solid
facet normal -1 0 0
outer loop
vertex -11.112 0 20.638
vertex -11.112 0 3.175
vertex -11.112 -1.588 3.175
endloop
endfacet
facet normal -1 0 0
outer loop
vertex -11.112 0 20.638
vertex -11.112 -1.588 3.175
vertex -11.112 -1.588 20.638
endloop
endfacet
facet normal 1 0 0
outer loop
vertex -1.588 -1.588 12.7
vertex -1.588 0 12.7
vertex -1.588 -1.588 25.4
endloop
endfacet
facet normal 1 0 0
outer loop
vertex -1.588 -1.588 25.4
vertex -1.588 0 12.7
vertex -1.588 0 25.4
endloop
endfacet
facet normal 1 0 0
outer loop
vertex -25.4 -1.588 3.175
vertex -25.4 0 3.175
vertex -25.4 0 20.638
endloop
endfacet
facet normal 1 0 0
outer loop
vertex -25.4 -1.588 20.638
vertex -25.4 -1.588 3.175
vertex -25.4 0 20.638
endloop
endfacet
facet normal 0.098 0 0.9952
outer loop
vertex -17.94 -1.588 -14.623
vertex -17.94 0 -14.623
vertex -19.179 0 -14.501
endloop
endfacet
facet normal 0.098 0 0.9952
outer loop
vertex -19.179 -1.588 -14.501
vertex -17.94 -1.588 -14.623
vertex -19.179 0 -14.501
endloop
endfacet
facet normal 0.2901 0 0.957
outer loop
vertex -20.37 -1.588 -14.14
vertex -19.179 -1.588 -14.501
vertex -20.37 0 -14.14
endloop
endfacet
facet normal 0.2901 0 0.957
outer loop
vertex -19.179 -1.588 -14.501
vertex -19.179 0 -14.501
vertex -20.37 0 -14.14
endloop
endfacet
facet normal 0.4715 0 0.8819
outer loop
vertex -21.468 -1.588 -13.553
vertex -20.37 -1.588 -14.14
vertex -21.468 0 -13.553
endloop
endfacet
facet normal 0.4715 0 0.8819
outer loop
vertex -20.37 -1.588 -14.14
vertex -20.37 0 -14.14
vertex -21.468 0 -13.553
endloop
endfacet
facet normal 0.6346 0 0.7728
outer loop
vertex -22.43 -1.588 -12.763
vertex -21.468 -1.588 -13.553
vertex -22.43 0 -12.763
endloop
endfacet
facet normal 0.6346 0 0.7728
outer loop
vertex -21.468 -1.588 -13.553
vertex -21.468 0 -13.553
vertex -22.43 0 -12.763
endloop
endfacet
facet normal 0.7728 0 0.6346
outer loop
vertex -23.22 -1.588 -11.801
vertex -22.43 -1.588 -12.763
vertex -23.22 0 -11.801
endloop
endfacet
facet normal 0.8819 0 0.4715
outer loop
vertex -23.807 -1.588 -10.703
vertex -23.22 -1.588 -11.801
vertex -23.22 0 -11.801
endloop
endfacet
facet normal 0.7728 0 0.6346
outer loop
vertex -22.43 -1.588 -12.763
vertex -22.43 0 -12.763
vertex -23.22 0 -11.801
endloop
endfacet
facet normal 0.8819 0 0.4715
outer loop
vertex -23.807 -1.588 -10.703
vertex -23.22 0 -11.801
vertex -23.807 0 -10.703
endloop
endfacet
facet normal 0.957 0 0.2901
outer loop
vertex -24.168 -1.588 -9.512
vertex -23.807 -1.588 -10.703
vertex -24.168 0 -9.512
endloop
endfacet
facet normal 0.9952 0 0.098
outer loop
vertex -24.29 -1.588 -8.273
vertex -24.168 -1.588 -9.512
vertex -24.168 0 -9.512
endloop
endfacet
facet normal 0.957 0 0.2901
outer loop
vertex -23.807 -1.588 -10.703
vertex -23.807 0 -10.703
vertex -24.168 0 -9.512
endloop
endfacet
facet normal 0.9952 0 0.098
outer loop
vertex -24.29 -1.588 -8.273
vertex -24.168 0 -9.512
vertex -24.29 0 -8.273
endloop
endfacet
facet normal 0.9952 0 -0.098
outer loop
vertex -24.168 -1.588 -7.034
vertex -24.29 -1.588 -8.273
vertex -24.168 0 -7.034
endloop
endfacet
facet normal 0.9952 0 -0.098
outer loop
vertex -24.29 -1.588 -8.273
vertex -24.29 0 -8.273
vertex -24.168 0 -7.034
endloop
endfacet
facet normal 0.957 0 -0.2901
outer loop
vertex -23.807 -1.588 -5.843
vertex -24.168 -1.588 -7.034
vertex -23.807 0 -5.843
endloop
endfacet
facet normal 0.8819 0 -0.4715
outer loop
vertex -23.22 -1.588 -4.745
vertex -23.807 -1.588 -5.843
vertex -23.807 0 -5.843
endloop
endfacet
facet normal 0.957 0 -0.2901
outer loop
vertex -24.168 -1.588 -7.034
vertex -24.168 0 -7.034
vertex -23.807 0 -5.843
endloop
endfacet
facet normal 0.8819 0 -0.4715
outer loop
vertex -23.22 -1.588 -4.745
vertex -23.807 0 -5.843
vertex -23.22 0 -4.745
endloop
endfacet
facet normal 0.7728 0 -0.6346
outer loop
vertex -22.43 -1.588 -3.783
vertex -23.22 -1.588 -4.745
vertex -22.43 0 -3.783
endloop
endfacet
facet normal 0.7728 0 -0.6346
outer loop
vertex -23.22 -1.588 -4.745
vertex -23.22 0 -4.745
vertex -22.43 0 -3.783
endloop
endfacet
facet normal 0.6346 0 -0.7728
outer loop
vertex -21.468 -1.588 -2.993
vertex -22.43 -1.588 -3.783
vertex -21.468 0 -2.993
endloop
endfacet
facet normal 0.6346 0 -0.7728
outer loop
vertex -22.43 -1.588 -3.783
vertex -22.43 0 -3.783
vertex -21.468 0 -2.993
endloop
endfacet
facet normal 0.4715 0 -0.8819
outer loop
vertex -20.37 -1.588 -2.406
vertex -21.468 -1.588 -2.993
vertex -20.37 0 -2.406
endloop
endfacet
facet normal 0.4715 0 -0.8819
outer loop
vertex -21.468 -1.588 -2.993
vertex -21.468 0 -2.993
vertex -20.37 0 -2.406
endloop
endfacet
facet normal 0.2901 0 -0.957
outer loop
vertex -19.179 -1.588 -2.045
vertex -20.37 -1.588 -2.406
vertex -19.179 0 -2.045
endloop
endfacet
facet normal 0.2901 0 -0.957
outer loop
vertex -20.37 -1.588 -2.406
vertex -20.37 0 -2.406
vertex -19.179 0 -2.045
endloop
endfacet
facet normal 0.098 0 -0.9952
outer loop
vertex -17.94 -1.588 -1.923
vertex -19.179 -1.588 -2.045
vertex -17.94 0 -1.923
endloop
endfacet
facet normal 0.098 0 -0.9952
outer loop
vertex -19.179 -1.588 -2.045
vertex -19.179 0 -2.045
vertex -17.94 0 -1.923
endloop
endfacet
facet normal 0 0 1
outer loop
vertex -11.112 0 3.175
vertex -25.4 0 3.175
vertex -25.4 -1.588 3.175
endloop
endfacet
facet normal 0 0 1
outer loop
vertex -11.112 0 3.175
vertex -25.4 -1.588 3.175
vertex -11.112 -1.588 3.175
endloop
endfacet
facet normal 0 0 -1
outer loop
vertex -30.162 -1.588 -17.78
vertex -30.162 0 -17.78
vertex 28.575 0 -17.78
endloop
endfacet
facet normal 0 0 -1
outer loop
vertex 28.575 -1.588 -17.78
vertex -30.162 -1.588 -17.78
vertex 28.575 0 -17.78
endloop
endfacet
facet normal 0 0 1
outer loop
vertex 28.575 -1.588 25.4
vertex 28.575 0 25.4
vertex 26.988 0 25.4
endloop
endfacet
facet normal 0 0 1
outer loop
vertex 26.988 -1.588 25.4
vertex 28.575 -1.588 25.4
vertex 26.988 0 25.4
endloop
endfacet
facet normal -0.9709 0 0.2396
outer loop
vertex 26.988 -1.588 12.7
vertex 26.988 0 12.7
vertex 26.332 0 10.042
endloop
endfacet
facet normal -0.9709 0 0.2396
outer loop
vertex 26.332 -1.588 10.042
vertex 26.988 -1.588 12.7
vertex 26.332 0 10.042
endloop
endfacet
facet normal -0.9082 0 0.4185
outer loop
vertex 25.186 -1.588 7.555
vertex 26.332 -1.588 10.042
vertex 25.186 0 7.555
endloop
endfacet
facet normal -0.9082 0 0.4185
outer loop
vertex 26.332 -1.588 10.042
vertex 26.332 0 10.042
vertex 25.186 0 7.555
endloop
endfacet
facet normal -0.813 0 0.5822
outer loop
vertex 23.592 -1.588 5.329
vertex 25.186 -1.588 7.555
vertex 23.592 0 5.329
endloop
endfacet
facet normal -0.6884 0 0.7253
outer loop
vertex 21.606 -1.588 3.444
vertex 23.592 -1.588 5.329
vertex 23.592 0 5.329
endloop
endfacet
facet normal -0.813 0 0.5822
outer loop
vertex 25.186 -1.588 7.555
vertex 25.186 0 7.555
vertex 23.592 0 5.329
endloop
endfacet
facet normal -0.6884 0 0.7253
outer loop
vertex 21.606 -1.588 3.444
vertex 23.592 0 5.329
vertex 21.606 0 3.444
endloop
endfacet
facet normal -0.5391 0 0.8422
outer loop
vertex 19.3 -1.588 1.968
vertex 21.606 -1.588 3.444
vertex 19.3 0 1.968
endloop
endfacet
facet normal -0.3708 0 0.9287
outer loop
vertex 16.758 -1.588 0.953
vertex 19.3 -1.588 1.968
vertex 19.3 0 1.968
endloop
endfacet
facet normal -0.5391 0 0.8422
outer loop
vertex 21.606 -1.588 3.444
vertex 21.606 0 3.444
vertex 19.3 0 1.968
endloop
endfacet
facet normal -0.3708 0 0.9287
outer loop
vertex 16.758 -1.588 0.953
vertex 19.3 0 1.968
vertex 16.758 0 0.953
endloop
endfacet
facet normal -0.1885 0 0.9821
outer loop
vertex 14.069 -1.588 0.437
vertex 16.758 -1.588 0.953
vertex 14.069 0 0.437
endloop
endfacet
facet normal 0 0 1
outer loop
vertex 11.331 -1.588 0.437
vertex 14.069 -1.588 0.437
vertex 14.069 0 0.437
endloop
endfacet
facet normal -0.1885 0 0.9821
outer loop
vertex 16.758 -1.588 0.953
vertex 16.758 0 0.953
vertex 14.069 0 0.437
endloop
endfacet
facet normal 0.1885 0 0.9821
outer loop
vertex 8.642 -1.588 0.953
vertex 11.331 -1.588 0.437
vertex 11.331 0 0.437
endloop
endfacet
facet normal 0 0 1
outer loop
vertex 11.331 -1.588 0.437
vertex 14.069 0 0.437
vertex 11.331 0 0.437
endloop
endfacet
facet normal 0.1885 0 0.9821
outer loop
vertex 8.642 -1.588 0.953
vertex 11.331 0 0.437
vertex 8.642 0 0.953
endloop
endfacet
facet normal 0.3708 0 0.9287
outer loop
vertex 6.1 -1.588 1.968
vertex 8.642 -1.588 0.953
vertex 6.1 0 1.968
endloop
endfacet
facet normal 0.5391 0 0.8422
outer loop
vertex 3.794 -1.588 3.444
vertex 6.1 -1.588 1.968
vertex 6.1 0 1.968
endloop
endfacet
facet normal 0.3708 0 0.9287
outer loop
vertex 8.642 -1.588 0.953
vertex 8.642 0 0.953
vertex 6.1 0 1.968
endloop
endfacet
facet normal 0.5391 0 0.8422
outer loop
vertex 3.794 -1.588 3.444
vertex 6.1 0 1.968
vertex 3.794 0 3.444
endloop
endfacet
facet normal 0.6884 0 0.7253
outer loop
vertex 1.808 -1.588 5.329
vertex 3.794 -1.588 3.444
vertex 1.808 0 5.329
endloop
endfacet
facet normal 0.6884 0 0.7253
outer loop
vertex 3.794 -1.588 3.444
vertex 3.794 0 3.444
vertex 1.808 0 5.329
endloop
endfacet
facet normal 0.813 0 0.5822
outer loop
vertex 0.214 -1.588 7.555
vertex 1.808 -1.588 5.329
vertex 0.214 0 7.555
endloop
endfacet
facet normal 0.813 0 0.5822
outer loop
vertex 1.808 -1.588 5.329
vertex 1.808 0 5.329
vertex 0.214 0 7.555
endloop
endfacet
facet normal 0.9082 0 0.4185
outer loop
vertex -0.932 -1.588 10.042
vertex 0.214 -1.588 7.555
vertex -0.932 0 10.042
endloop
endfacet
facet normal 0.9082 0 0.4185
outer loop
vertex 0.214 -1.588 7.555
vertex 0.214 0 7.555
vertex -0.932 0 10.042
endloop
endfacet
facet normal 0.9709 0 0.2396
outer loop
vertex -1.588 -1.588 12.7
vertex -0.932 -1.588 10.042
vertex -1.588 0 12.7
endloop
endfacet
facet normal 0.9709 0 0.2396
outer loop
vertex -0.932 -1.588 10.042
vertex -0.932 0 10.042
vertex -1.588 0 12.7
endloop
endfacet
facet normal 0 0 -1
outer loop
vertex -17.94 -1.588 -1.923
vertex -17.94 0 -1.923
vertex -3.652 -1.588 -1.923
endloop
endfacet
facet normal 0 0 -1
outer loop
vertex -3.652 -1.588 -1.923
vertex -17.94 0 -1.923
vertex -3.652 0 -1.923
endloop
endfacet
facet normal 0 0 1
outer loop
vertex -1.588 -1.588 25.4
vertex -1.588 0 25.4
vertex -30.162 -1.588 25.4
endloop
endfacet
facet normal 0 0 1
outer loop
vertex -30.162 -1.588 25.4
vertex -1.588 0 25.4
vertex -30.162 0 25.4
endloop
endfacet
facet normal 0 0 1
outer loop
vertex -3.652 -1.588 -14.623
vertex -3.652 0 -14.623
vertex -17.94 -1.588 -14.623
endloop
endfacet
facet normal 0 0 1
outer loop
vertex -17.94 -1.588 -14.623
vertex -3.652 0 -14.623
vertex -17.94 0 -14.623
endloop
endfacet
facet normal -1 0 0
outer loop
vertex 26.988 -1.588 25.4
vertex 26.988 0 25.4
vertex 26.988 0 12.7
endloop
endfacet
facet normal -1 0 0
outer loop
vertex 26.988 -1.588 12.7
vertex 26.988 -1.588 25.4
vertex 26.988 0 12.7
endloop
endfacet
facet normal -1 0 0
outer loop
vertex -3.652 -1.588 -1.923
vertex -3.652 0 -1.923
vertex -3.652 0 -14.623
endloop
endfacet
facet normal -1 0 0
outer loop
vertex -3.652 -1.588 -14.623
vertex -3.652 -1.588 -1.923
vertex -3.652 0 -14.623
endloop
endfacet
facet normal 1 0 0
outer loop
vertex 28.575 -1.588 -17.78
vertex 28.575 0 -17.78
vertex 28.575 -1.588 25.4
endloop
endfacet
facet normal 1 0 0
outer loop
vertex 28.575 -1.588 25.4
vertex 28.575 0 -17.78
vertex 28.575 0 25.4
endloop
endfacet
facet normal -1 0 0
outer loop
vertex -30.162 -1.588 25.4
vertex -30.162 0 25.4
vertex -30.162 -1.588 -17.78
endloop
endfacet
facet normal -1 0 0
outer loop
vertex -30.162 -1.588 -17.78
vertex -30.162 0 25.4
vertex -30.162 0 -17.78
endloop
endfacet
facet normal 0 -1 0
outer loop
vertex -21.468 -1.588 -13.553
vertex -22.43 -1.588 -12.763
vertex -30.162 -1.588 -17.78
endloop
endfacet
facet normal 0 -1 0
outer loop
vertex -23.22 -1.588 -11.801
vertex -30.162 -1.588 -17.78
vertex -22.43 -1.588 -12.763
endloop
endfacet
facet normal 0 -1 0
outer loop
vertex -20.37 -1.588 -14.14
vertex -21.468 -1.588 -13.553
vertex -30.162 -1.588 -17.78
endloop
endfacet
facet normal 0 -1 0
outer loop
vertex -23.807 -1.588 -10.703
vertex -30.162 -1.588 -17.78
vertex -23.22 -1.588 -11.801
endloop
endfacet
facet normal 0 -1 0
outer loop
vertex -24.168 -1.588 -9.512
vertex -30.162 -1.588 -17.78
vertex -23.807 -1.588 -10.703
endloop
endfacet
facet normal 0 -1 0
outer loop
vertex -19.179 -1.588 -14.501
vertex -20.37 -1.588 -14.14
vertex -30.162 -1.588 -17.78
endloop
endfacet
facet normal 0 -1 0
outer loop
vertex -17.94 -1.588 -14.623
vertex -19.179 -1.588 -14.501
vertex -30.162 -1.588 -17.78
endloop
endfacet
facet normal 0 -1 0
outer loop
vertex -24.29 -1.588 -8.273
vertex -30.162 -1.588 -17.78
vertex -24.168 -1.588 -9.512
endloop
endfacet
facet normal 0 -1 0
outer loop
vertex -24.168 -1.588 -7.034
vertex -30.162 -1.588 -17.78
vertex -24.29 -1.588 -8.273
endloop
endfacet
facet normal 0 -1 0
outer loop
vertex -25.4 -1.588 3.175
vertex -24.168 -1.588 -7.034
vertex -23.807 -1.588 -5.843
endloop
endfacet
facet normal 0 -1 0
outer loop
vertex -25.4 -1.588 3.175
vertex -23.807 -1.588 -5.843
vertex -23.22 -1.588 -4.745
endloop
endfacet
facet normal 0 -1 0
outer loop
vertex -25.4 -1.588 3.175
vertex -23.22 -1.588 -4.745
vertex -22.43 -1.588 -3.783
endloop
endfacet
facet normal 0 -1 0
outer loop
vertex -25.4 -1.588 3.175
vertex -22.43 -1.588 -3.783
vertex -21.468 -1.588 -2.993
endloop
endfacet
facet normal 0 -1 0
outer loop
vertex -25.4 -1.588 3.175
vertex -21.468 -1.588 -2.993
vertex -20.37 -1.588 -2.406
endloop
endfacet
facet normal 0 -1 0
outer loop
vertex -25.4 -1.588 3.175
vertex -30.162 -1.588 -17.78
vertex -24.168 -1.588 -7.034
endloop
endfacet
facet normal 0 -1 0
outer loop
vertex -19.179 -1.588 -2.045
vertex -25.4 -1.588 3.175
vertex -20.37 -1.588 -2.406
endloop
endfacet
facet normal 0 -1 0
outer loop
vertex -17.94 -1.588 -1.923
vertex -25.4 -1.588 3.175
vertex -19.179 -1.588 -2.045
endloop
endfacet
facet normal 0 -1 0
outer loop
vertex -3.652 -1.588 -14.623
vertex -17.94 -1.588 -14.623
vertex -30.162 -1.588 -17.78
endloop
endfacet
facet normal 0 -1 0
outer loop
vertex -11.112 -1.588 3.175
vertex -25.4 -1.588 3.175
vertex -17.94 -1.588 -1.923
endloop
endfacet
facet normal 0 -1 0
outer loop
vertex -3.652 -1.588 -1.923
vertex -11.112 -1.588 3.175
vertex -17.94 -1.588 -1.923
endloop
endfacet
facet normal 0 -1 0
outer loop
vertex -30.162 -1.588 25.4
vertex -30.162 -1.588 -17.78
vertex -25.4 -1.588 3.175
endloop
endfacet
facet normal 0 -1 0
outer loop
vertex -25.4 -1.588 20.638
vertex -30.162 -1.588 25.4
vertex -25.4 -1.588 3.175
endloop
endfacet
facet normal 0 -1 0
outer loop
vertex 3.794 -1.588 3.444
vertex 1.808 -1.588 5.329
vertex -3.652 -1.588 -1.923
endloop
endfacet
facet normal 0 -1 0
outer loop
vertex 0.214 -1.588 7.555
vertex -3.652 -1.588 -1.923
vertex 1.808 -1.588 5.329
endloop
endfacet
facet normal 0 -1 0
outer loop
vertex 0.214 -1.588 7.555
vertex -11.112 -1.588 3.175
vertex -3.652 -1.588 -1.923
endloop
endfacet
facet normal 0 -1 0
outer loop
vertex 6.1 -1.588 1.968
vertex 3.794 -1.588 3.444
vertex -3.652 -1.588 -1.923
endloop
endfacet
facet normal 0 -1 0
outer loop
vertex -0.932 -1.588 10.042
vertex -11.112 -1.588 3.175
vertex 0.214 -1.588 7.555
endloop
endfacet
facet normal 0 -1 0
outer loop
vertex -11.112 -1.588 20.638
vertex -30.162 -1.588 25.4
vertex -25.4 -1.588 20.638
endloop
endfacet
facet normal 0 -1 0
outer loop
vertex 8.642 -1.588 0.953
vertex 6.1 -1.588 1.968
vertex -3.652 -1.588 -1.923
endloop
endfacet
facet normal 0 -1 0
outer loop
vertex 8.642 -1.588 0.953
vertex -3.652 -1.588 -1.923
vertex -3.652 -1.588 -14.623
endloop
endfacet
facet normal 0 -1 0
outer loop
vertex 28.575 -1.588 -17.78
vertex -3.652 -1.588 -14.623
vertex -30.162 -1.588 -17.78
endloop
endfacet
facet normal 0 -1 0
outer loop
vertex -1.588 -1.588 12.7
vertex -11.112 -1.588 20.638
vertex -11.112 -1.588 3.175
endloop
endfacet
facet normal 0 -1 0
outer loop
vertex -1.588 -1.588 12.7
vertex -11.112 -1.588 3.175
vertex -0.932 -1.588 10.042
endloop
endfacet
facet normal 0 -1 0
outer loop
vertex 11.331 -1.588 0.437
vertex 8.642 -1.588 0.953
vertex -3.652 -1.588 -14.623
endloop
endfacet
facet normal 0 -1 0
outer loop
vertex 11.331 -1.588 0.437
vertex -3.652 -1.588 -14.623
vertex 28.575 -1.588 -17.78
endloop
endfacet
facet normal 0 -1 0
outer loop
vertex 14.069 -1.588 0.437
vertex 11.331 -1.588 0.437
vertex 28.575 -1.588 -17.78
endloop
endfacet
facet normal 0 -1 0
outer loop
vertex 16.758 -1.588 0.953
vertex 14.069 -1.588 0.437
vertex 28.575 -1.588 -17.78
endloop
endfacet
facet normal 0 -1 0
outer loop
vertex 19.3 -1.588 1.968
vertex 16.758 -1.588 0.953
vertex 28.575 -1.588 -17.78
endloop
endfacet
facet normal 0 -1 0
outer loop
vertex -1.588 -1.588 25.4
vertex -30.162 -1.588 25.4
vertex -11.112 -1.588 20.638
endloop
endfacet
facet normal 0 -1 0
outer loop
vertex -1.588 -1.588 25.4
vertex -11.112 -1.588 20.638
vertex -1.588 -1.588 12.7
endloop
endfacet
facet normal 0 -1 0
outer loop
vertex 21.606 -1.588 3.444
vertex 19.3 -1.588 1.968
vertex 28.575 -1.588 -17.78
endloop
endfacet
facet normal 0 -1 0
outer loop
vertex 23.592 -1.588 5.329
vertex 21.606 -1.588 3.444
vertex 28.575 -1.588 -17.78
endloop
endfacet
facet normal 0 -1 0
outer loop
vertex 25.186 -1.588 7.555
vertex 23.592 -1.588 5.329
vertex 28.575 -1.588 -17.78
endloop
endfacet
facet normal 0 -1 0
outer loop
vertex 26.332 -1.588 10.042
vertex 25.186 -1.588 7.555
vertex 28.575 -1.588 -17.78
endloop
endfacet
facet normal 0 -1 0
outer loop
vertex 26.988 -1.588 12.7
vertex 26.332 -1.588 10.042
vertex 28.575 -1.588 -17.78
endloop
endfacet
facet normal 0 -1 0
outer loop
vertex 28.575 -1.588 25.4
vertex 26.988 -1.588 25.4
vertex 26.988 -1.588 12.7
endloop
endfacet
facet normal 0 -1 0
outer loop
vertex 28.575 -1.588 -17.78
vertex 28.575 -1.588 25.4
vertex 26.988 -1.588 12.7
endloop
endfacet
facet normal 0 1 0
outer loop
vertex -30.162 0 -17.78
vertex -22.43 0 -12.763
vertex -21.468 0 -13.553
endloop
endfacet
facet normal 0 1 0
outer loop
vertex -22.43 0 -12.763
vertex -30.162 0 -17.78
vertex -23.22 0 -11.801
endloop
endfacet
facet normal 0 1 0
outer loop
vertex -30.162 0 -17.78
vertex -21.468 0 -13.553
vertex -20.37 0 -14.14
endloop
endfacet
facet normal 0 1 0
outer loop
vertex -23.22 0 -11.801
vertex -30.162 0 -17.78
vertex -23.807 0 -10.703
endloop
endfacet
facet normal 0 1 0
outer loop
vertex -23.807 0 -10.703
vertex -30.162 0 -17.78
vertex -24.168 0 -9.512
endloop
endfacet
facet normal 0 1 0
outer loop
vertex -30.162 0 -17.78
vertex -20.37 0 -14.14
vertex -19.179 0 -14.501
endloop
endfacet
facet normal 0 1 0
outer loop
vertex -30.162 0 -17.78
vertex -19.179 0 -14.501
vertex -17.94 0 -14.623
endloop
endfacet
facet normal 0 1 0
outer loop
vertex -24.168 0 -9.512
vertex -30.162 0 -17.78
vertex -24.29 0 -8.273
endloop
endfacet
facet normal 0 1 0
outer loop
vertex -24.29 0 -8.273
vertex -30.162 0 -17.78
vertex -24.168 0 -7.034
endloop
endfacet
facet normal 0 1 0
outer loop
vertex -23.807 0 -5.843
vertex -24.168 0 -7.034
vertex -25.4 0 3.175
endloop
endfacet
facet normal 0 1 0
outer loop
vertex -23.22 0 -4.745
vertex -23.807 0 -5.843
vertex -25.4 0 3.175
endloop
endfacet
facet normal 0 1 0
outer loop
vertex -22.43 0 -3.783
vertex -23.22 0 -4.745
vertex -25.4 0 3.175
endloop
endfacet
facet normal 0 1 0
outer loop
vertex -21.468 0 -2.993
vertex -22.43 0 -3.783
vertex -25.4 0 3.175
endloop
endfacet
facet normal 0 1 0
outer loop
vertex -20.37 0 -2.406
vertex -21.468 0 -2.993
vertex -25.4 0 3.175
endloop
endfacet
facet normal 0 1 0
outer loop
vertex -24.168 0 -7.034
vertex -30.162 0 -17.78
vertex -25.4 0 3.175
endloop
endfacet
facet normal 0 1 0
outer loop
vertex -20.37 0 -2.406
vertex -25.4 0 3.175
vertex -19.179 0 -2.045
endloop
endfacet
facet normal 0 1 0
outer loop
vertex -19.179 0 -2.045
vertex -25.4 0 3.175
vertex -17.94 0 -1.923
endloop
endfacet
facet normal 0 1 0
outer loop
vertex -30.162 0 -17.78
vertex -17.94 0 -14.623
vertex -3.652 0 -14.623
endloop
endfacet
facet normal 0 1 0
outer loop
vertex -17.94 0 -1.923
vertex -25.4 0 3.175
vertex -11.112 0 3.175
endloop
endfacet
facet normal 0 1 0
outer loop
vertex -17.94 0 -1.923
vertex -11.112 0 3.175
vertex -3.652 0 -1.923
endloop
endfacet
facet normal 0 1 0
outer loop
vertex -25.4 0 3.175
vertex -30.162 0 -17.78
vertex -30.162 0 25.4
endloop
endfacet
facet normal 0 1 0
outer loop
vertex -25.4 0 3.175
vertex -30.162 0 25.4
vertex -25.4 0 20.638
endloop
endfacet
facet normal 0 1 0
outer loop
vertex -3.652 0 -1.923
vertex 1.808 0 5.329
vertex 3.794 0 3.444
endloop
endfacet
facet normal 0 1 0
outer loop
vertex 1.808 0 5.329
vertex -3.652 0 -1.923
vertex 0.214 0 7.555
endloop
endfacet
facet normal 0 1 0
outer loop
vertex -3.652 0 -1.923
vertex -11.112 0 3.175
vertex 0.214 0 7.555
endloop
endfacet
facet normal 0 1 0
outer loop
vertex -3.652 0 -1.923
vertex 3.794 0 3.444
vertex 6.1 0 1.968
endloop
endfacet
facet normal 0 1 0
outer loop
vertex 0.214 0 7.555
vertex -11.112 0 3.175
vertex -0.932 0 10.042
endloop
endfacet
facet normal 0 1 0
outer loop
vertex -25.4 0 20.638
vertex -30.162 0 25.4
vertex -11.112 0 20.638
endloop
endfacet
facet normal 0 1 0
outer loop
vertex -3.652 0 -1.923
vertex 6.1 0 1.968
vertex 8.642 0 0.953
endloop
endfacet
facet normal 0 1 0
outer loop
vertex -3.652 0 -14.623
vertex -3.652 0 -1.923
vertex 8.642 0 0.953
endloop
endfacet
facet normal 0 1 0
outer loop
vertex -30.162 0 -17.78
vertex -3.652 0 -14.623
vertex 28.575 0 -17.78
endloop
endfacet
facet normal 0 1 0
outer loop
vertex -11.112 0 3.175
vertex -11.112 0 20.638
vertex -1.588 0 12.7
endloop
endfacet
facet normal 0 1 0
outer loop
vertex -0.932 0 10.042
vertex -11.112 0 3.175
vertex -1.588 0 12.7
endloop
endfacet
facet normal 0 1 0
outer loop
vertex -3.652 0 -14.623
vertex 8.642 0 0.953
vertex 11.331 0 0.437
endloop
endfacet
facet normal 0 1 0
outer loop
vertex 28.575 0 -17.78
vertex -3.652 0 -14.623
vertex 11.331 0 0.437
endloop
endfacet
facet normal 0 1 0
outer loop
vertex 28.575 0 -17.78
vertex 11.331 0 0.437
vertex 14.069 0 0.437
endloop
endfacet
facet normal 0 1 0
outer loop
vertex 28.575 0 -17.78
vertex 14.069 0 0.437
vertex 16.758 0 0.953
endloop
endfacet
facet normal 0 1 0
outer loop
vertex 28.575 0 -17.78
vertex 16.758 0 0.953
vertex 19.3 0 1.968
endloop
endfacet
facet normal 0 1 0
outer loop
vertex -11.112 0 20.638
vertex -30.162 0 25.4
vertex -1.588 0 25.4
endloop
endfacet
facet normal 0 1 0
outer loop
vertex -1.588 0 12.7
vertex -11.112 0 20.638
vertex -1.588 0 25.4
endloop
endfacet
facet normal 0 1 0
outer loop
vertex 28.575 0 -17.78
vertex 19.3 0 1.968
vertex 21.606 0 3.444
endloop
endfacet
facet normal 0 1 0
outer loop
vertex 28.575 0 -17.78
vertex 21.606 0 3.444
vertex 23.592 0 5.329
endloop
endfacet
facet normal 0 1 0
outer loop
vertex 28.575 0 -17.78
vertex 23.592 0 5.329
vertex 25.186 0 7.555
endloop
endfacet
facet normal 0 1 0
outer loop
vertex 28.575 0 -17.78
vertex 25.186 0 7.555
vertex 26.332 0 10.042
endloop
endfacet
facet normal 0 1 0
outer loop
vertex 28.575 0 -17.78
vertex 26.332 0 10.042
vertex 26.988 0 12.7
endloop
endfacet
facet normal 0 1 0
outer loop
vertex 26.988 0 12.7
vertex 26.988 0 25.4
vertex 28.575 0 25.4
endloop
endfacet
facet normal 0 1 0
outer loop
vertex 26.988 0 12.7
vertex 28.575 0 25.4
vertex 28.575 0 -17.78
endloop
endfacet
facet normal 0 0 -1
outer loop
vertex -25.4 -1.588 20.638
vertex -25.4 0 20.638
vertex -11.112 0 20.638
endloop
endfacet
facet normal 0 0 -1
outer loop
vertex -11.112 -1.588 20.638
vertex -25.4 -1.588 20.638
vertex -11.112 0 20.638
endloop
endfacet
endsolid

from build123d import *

# Parameters (mm, degrees)
F0_W     = 14.2875
F0_H     = 17.4625
F1_DEPTH = 1.5875


with BuildPart() as f1:
    # F0 (on Front) → F1 (new body)
    with BuildSketch(Plane.XZ):
        with BuildLine():
            Line((-30.1625, 25.4), (-30.1625, -17.78))
            Line((-30.1625, -17.78), (28.575, -17.78))
            Line((28.575, -17.78), (28.575, 25.4))
            Line((28.575, 25.4), (26.9875, 25.4))
            Line((26.9875, 25.4), (26.9875, 12.7))
            ThreePointArc((26.9875, 12.7), (12.7, 0.371714), (-1.5875, 12.7))
            Line((-1.5875, 12.7), (-1.5875, 25.4))
            Line((-1.5875, 25.4), (-30.1625, 25.4))
        make_face()
        with BuildLine():
            ThreePointArc((-17.939954, -14.622975), (-24.289954, -8.272975), (-17.939954, -1.922975))
            Line((-17.939954, -1.922975), (-3.652454, -1.922975))
            Line((-3.652454, -1.922975), (-3.652454, -14.622975))
            Line((-3.652454, -14.622975), (-17.939954, -14.622975))
        make_face(mode=Mode.SUBTRACT)
        with Locations((-18.25625, 11.90625)):
            Rectangle(F0_W, F0_H, mode=Mode.SUBTRACT)
    extrude(amount=F1_DEPTH)


solid = f1.part
